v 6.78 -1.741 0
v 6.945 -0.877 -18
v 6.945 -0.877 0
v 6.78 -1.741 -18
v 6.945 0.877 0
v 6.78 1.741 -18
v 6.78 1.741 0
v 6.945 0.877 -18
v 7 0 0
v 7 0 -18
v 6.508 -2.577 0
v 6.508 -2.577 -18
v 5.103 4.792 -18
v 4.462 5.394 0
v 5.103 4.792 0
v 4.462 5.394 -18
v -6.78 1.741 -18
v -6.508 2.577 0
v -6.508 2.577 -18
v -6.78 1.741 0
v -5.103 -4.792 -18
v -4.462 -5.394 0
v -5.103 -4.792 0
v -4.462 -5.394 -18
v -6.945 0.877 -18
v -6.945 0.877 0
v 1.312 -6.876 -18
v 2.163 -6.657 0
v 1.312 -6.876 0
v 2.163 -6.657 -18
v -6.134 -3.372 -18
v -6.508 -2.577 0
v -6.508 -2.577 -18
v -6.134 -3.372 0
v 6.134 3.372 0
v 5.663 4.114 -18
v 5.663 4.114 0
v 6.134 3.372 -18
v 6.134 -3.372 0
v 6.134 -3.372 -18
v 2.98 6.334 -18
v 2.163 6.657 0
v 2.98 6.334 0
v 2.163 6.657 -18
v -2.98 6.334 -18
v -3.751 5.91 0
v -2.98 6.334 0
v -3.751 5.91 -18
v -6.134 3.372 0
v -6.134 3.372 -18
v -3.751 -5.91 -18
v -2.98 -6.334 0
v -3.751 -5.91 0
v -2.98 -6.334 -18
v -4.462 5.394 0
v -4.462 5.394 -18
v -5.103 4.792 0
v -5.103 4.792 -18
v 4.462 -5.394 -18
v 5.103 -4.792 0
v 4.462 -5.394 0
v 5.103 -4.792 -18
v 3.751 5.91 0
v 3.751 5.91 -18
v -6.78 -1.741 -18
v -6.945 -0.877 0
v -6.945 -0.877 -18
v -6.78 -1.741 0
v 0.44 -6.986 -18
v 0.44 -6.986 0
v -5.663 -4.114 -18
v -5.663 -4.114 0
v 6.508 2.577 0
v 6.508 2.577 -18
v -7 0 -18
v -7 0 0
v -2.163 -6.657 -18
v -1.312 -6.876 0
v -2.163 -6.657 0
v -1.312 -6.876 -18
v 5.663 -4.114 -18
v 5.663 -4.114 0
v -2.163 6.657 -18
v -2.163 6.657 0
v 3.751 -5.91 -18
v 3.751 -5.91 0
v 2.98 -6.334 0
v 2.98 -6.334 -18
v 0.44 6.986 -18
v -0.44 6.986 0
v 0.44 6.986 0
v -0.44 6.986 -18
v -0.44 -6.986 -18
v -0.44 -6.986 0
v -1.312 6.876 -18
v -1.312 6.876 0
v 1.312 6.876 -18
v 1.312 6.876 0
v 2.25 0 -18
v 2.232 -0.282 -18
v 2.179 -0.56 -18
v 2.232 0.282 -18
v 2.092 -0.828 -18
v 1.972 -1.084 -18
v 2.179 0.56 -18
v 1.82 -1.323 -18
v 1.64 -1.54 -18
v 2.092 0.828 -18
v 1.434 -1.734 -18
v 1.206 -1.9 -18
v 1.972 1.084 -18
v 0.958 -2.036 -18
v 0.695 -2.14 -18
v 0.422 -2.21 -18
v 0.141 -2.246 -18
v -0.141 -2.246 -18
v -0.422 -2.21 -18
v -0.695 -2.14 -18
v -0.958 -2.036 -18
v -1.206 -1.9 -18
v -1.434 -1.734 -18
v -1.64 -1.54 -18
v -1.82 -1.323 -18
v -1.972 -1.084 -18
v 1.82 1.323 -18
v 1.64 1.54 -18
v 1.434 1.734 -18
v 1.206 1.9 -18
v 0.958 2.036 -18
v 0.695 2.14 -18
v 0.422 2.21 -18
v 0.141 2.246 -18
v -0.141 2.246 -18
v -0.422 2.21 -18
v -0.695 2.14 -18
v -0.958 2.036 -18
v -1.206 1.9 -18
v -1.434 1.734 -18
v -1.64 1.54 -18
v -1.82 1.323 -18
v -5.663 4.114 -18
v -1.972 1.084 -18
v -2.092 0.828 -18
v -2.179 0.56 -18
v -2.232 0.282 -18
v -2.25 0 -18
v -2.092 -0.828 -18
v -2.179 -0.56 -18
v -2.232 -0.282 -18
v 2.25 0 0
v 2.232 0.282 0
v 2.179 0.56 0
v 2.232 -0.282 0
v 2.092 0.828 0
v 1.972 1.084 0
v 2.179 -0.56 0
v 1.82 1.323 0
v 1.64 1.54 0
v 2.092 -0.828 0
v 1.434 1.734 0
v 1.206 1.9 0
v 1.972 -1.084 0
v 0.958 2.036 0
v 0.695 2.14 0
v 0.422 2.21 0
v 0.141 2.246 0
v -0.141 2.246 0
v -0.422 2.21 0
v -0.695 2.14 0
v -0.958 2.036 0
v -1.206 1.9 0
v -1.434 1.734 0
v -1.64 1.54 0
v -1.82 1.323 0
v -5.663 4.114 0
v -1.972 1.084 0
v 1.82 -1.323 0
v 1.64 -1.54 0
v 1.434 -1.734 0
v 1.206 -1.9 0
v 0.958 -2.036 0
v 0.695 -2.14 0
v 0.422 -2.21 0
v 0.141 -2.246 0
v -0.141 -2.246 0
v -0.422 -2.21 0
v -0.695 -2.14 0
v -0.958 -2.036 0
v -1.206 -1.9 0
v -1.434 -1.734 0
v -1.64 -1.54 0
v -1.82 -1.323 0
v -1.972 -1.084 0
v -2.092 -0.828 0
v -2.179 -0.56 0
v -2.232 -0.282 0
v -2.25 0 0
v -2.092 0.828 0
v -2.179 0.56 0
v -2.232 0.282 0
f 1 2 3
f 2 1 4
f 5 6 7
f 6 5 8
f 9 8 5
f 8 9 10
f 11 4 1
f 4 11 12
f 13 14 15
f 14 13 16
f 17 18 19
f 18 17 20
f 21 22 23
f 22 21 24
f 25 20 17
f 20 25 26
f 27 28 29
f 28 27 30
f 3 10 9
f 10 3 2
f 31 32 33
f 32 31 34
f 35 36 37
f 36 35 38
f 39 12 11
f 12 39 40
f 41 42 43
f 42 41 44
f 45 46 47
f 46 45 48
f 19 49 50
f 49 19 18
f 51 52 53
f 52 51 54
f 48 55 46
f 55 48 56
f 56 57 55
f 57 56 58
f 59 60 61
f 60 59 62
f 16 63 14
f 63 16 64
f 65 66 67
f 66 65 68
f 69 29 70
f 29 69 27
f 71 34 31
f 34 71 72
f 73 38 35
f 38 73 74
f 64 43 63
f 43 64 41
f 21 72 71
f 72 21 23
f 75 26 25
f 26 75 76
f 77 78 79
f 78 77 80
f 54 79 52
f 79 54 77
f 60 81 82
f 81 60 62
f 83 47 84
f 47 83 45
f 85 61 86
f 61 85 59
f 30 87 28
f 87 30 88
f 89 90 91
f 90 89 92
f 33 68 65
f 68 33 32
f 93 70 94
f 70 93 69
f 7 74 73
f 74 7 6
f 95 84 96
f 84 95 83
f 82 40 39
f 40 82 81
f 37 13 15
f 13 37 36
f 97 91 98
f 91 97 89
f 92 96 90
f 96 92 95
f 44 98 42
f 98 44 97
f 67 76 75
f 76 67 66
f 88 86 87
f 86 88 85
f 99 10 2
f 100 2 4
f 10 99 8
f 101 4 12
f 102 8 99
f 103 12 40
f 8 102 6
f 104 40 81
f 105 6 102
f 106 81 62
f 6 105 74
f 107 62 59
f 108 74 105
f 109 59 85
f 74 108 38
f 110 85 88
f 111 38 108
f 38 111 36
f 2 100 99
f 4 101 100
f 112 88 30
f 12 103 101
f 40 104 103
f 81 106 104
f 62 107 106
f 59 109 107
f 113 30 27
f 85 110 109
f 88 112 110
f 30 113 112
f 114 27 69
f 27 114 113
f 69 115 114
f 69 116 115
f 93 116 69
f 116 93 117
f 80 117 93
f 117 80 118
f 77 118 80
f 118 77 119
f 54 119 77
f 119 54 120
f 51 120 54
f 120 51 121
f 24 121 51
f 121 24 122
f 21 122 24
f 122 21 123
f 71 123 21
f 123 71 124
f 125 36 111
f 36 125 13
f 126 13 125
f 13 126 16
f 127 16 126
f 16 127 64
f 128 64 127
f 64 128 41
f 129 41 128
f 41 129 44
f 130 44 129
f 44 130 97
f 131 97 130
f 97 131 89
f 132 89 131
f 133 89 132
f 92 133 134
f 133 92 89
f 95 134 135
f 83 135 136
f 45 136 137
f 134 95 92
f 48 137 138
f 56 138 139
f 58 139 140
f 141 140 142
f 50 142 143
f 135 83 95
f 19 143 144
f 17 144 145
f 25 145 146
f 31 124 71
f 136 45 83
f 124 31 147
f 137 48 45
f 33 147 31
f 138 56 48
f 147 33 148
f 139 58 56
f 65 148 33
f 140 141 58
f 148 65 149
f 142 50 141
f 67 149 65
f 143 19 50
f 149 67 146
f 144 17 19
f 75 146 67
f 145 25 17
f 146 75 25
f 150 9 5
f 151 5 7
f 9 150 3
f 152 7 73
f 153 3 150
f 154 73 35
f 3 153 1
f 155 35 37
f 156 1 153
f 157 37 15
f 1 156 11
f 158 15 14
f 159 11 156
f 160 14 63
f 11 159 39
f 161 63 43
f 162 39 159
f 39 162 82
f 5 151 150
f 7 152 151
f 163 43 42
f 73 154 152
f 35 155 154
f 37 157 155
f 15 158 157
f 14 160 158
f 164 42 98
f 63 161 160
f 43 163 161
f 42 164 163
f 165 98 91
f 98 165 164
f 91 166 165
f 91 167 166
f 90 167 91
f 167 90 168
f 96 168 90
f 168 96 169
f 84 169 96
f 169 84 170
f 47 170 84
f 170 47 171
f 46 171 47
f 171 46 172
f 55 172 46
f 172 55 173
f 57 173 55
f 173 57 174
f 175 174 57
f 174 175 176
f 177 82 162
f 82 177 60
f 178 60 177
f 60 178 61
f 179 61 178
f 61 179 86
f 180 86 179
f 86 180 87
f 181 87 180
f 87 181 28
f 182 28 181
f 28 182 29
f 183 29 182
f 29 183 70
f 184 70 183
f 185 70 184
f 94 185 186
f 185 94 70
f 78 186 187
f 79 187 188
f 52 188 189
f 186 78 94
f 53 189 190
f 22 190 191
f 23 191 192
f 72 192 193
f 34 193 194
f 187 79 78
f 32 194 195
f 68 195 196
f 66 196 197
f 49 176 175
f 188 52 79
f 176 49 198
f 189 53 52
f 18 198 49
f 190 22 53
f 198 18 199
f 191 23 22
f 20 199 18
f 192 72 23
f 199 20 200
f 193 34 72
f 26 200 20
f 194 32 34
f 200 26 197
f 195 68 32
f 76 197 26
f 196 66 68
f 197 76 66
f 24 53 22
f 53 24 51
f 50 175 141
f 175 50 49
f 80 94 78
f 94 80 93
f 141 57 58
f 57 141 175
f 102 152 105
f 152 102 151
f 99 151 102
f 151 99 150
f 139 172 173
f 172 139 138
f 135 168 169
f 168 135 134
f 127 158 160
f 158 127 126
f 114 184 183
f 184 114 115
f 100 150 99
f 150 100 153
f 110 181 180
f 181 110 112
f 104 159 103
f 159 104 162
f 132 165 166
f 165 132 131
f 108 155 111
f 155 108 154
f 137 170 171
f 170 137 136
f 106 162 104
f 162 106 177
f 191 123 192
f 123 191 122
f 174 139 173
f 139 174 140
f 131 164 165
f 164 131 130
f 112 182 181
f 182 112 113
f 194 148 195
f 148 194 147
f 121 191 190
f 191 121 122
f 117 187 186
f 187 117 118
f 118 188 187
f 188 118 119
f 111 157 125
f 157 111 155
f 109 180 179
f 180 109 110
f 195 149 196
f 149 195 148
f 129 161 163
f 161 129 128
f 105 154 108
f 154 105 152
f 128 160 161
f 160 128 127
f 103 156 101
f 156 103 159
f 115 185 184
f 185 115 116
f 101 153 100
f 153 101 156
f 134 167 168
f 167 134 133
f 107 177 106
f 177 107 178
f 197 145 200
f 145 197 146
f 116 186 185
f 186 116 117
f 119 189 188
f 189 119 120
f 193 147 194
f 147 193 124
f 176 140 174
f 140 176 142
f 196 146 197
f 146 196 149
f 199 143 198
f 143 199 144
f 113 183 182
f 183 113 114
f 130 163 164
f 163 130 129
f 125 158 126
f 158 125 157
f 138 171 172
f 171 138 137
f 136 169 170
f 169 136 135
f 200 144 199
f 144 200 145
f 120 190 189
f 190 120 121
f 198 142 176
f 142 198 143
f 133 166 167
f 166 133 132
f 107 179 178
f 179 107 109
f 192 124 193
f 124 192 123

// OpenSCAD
$fn = 50;


difference() {
	union() {
		translate(v = [0, 0, -18.0000000000]) {
			cylinder(h = 18, r = 7.0000000000);
		}
	}
	union() {
		#translate(v = [0, 0, -18]) {
			cylinder(h = 18, r = 2.2500000000);
		}
	}
}
